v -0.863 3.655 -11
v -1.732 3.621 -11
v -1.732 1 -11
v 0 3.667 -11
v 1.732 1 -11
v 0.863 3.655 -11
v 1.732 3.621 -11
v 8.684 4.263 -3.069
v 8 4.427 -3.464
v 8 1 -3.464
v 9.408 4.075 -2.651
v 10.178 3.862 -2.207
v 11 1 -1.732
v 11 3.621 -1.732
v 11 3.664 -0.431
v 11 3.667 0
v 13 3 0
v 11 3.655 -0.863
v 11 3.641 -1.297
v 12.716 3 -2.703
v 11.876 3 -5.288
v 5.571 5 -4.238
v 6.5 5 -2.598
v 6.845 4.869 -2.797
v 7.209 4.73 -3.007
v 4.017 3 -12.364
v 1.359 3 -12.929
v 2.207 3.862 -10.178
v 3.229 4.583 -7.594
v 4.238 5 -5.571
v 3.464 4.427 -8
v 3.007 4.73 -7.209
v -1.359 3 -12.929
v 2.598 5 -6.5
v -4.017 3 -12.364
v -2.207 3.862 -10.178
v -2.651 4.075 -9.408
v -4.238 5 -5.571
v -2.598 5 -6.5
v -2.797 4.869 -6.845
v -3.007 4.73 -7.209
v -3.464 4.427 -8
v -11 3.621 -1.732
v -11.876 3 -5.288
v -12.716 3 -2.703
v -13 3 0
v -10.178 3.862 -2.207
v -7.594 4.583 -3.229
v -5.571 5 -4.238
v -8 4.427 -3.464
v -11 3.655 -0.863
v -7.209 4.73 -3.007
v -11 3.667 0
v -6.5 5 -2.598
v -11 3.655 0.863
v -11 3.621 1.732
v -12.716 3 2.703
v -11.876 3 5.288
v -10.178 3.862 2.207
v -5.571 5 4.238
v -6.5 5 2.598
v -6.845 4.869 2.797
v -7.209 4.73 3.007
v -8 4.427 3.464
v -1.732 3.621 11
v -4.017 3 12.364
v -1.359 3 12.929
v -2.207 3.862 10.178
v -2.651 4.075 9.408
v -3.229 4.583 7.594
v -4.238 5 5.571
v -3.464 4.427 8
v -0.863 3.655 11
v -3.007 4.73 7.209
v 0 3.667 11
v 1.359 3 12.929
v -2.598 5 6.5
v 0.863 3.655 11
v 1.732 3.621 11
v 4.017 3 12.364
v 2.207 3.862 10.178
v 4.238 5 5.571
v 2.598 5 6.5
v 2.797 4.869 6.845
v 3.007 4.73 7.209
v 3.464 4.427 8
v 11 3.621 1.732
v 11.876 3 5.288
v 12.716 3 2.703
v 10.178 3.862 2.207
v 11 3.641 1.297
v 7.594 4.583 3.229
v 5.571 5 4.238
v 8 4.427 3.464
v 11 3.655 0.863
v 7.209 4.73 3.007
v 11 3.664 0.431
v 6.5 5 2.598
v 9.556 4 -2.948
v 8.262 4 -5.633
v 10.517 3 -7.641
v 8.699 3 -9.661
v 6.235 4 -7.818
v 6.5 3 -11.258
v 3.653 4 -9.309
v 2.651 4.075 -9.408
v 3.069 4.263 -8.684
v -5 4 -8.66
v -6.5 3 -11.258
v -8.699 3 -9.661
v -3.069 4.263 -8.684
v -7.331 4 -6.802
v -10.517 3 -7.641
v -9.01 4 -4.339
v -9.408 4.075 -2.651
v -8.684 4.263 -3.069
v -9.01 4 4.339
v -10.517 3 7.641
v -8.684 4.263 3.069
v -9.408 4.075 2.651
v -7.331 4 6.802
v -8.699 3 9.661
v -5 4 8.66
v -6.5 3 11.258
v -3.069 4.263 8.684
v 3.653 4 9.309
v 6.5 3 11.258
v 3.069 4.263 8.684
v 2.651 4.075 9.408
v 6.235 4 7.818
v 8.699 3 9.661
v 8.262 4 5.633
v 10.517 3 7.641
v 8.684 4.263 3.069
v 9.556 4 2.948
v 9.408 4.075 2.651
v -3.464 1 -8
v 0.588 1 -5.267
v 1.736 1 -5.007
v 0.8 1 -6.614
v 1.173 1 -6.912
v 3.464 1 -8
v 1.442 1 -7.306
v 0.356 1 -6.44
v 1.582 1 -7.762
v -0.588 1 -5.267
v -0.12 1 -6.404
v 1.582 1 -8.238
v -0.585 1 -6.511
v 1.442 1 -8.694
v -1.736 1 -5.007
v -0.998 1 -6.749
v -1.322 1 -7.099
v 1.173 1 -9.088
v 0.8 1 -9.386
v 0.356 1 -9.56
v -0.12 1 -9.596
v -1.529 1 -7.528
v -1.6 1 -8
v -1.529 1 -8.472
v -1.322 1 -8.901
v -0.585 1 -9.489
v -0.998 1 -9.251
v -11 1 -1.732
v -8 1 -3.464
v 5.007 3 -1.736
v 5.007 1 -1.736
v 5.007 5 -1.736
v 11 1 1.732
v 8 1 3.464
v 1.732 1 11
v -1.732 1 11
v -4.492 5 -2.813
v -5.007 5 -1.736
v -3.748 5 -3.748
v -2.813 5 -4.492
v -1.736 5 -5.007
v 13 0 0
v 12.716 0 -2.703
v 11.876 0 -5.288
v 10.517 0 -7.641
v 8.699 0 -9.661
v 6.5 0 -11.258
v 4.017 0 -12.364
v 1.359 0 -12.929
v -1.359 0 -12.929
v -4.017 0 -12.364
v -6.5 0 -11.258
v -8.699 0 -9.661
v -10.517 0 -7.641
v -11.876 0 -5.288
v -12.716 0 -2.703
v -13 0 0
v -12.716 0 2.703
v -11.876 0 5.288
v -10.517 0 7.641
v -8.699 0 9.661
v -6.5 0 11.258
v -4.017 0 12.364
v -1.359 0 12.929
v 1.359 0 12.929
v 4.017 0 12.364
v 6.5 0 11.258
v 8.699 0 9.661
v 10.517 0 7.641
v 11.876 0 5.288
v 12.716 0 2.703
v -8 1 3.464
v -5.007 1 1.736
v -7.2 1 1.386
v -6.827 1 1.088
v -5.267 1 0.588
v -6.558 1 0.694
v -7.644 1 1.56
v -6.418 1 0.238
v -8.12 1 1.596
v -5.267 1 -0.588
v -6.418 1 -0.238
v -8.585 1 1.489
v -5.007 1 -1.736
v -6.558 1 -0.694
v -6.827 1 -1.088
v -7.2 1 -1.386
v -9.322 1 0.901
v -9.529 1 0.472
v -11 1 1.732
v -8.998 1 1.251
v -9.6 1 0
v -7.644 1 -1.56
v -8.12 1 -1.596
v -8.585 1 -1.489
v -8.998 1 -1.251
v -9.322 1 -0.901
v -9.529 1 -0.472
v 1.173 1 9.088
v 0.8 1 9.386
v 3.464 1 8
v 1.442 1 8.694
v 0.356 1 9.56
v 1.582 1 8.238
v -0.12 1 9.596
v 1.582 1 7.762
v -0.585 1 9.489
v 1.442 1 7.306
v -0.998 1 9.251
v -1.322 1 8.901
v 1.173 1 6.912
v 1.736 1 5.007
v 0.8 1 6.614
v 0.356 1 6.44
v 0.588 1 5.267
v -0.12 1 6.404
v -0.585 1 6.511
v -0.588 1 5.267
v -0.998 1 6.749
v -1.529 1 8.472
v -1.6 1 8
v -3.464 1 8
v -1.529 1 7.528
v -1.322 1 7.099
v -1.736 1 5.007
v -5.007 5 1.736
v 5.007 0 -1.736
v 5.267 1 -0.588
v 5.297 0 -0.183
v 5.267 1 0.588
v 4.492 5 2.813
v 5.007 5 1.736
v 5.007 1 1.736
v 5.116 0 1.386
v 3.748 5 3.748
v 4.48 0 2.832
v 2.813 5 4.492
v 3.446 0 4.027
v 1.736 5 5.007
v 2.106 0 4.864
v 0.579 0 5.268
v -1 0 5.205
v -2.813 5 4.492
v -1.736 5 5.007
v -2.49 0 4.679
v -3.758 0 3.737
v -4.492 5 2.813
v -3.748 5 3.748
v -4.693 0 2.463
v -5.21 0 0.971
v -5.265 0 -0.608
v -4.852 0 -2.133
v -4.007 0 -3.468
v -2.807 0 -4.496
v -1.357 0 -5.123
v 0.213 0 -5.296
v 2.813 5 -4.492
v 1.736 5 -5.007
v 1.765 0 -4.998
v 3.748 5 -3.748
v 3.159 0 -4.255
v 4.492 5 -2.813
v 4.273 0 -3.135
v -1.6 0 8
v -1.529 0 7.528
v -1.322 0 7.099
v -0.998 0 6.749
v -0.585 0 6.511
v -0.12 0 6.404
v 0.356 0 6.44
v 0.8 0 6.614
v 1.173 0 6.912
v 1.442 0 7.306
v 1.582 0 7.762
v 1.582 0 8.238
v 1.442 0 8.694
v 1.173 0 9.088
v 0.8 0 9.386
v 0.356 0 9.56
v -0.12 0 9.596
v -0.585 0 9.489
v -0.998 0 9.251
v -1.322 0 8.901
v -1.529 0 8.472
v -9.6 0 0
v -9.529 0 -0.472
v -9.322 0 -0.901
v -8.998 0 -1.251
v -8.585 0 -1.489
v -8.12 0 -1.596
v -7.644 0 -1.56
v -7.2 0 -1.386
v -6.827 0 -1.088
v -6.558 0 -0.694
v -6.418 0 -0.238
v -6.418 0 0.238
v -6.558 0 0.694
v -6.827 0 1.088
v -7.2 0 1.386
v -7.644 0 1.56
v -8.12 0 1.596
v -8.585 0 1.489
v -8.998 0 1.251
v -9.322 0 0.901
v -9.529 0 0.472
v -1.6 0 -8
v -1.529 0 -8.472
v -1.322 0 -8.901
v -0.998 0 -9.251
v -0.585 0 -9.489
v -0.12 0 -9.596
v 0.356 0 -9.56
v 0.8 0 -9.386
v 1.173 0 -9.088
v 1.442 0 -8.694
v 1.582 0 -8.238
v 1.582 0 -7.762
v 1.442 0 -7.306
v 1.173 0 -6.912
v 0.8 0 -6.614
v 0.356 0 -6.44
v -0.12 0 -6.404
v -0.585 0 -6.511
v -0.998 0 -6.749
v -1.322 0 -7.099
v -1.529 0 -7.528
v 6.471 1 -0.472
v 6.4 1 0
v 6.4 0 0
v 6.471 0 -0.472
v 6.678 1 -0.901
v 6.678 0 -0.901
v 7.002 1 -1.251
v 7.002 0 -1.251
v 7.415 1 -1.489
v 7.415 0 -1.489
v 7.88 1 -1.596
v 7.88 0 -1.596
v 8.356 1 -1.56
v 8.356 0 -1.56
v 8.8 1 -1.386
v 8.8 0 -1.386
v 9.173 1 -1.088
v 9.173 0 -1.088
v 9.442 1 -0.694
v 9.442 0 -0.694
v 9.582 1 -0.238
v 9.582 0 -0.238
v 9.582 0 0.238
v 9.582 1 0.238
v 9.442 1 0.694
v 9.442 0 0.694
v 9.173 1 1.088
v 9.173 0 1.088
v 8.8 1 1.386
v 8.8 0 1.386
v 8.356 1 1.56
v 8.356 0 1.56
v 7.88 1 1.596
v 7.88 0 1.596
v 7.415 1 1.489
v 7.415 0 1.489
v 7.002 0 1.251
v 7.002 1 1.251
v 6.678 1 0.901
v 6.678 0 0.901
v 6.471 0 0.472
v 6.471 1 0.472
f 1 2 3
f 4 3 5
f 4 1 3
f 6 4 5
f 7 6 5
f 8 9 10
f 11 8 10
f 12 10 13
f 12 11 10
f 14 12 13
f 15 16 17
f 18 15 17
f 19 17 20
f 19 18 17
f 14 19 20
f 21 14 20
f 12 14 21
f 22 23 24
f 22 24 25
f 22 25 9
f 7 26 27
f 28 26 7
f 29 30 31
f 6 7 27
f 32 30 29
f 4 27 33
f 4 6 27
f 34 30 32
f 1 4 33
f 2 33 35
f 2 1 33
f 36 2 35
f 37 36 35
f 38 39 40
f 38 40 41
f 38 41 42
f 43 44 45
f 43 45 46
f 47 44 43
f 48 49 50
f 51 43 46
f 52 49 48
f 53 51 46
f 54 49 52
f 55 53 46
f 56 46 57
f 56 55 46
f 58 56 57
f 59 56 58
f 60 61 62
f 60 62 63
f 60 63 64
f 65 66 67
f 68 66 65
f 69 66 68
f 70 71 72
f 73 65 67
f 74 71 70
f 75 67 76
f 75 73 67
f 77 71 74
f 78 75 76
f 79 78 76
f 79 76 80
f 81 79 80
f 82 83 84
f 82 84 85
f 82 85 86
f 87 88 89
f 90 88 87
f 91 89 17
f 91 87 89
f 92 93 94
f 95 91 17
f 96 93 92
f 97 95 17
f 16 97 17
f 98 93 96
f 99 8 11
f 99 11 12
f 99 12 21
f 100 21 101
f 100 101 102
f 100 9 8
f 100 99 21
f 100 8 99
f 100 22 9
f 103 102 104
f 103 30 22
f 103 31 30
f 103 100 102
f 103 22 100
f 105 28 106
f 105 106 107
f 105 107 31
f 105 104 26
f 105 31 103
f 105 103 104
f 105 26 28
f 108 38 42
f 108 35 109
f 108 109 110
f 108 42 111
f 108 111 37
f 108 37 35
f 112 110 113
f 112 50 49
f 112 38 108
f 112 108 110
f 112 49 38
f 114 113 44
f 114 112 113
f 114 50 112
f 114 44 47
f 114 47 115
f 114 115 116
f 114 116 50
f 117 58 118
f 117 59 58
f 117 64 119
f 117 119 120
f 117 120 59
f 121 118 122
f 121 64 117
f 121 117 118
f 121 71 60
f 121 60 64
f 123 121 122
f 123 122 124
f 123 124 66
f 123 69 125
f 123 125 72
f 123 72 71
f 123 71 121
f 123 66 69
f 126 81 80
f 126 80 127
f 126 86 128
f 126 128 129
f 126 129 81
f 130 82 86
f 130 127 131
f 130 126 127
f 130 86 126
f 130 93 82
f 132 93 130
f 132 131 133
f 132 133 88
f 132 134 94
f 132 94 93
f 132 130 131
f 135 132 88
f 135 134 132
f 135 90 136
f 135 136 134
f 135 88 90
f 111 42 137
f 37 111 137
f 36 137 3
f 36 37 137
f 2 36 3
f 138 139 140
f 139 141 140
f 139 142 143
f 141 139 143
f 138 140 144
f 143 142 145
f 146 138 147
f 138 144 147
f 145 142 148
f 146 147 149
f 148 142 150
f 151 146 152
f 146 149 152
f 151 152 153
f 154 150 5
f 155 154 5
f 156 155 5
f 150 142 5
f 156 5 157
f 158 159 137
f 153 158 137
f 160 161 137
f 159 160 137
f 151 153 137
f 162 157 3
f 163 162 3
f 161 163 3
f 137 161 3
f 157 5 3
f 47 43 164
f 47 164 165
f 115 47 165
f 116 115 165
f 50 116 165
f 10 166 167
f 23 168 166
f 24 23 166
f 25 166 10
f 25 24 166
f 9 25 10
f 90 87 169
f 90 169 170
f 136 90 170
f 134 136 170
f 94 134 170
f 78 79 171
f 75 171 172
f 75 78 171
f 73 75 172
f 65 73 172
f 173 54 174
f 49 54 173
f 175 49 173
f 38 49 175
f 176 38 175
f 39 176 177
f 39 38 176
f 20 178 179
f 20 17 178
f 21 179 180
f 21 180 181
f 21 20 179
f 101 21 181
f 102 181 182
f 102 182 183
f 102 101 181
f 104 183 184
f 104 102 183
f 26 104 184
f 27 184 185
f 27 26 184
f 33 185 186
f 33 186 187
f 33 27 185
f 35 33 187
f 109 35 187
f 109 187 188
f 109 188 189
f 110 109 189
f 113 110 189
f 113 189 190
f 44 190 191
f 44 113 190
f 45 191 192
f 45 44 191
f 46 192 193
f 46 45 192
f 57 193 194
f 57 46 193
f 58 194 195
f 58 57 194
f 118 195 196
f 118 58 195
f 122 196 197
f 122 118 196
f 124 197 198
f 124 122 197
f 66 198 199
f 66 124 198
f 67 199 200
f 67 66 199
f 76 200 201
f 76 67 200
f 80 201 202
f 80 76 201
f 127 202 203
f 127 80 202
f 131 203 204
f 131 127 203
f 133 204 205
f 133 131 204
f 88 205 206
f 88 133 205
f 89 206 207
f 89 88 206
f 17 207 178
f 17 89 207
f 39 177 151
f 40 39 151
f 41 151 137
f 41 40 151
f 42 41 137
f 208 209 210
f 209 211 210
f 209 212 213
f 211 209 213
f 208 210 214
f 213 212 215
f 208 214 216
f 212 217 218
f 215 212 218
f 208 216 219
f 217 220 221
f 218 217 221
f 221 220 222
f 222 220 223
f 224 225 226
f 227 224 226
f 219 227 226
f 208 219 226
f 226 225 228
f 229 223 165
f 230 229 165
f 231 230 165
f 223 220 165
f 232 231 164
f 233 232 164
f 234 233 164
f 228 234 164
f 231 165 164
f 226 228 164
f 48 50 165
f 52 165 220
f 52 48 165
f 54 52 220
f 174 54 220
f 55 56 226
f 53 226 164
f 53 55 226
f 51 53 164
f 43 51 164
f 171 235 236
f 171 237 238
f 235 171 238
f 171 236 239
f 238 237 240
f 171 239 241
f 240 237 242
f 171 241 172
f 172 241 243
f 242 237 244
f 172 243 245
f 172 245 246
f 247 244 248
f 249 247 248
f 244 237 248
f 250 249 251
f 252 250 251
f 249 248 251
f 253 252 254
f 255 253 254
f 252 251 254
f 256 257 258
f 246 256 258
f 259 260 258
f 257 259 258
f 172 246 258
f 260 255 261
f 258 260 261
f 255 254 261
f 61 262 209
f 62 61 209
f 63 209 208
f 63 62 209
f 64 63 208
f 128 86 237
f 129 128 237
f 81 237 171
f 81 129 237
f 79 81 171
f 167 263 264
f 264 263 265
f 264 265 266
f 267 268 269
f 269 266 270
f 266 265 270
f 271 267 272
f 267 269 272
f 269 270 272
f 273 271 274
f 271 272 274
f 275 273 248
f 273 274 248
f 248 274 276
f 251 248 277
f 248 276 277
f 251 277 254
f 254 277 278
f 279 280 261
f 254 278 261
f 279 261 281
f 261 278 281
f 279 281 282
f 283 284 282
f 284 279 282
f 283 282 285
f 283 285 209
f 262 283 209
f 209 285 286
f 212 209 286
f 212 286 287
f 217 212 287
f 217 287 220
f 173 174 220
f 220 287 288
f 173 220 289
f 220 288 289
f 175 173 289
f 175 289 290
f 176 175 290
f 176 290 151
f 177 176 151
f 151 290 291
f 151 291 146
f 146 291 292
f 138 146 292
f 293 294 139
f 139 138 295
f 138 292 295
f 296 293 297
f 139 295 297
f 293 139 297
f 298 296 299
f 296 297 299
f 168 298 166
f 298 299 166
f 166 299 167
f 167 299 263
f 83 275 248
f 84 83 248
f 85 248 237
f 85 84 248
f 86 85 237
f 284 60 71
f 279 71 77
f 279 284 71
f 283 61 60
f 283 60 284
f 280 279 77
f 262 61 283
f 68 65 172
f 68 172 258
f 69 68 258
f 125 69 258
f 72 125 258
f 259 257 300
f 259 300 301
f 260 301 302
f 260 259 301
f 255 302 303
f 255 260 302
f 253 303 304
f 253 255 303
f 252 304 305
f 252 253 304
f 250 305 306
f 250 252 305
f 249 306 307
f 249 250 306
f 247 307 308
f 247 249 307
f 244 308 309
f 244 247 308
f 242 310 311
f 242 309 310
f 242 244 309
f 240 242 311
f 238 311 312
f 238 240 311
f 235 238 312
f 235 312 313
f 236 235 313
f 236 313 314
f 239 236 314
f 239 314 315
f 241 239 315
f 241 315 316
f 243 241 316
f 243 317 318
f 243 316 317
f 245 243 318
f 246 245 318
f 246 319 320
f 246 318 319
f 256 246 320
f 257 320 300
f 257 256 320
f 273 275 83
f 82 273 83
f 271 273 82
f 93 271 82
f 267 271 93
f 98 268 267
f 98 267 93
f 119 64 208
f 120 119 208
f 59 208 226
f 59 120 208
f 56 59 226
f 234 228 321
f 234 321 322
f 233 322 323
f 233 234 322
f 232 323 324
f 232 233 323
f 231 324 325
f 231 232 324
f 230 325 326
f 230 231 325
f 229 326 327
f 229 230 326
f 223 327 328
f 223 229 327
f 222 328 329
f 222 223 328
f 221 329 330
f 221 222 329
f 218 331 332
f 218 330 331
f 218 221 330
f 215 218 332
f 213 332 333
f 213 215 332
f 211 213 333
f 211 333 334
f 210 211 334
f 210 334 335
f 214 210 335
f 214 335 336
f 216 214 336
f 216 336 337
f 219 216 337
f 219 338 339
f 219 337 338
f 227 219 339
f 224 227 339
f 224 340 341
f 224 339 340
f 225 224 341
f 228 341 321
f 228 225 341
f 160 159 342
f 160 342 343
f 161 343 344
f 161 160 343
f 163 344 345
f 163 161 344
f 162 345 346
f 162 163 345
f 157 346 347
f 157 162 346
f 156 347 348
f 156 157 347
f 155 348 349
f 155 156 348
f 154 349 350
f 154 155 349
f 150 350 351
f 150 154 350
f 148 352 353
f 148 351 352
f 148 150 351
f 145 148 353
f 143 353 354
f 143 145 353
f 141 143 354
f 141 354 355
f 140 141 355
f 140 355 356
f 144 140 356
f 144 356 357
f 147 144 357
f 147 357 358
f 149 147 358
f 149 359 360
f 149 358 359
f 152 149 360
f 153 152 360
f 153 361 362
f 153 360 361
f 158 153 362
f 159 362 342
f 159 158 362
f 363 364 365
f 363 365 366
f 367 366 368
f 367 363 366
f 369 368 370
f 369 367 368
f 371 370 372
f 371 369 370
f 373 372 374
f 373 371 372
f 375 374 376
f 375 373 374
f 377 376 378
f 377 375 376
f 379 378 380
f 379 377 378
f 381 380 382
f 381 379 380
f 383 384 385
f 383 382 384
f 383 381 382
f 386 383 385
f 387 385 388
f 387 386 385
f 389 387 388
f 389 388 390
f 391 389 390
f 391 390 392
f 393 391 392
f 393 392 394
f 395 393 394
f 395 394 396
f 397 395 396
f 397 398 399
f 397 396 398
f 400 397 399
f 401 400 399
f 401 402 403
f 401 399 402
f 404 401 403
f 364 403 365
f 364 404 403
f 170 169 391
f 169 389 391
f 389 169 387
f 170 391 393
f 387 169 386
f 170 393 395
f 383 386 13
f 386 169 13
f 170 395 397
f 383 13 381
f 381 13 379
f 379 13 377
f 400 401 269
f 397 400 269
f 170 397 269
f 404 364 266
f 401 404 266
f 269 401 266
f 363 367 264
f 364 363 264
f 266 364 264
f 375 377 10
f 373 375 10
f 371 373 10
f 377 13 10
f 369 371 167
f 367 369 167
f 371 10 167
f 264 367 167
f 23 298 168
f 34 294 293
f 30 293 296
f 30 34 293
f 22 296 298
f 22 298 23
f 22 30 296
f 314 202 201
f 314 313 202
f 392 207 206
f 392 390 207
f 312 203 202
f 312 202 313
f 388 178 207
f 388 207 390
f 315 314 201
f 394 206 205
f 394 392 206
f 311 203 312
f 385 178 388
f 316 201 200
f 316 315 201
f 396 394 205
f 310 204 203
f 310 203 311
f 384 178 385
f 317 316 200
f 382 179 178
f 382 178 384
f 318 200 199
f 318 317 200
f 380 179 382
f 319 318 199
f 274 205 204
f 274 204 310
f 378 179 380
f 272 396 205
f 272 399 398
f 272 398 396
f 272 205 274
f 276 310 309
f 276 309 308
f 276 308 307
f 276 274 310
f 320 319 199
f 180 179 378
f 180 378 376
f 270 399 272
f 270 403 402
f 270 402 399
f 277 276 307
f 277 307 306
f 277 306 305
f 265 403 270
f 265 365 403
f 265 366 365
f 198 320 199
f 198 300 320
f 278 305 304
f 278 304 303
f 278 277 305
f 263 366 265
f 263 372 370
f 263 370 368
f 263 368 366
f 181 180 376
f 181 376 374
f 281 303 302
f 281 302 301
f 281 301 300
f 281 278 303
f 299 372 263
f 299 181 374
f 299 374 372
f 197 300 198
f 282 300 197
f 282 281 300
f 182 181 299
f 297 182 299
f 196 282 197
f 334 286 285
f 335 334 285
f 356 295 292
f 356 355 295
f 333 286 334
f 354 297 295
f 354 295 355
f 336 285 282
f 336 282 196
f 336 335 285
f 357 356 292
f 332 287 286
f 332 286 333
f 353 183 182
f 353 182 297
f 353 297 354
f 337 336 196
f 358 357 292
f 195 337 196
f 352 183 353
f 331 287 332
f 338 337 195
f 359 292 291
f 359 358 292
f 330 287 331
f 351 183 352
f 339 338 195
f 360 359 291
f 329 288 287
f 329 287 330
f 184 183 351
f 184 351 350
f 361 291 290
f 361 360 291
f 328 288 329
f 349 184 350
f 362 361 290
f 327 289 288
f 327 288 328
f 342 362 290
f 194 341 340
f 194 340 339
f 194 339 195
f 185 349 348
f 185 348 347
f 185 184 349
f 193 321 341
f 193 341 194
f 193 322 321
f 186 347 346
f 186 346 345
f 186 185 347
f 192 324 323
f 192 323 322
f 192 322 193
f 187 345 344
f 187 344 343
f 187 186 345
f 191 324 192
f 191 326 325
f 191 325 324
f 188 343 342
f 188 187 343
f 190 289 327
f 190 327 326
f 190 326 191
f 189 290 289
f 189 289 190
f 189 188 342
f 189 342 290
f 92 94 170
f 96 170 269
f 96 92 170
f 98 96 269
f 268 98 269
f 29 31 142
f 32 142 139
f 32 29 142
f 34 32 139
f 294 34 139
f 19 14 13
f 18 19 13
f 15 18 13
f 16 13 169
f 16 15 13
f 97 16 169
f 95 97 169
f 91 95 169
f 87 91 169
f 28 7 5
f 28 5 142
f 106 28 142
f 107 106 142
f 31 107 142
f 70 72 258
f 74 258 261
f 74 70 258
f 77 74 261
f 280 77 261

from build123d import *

# Parameters (mm, degrees)
CUT_EXTRUDE_1_DEPTH      = 4.5
CUT_EXTRUDE_1_DEPTH_BACK = 3.5
SKETCH_6_R               = 1.6
CUT_EXTRUDE_2_DEPTH      = 20.189841062
CUT_EXTRUDE_START        = 10
SKETCH_8_R               = 5.3
CUT_EXTRUDE_3_DEPTH      = 10


with BuildPart() as part:
    # 草图2 → 旋转1 (revolve)
    with BuildSketch(Plane.XY, mode=Mode.PRIVATE) as revolve_1_sk:
        Polygon((0, 0), (-13, 0), (-13, 3), (-7, 5), (-5.3, 5), (-5.3, 3), (0, 3), (0, 1.5), align=None)
    revolve(revolve_1_sk.sketch.rotate(Axis((0, 0, 0), (0, 1, 0)), 180), axis=Axis((0, 0, 0), (0, 1, 0)))

    # 草图5 → 切除-拉伸1 (cut, two sides: drawn at the far end of the back side and taken through both)
    with BuildSketch(Plane(origin=(0, 5.5, 0), x_dir=(-1, 0, 0), z_dir=(0, -1, 0)).offset(-CUT_EXTRUDE_1_DEPTH_BACK)):
        Polygon((8, -3.464101615), (11, -1.732050808), (11, 1.732050808), (8, 3.464101615), (5, 1.732050808), (5, -1.732050808), align=None)
        Polygon((3.464101615, 8), (1.732050808, 11), (-1.732050808, 11), (-3.464101615, 8), (-1.732050808, 5), (1.732050808, 5), align=None)
        Polygon((-3.464101615, -8), (-1.732050808, -11), (1.732050808, -11), (3.464101615, -8), (1.732050808, -5), (-1.732050808, -5), align=None)
        Polygon((-8, 3.464101615), (-11, 1.732050808), (-11, -1.732050808), (-8, -3.464101615), (-5, -1.732050808), (-5, 1.732050808), align=None)
    extrude(amount=CUT_EXTRUDE_1_DEPTH + CUT_EXTRUDE_1_DEPTH_BACK, mode=Mode.SUBTRACT)

    # 草图6 → 切除-拉伸2 (cut, through all)
    with BuildSketch(Plane(origin=(0, 5.5, 0), x_dir=(-1, 0, 0), z_dir=(0, -1, 0))):
        with Locations((0, 8)):
            Circle(SKETCH_6_R)
        with Locations((8, 0)):
            Circle(SKETCH_6_R)
        with Locations((0, -8)):
            Circle(SKETCH_6_R)
        with Locations((-8, 0)):
            Circle(SKETCH_6_R)
    extrude(amount=CUT_EXTRUDE_2_DEPTH, mode=Mode.SUBTRACT)

    # 草图8 → 切除-拉伸3 (cut)
    with BuildSketch(Plane(origin=(0, 5.5, 0), x_dir=(-1, 0, 0), z_dir=(0, -1, 0)).offset(CUT_EXTRUDE_START)):
        with Locations(Location((0, 0, 0), (0, 0, 160.875716495))):
            Circle(SKETCH_8_R)
    extrude(amount=-CUT_EXTRUDE_3_DEPTH, mode=Mode.SUBTRACT)


solid = part.part
